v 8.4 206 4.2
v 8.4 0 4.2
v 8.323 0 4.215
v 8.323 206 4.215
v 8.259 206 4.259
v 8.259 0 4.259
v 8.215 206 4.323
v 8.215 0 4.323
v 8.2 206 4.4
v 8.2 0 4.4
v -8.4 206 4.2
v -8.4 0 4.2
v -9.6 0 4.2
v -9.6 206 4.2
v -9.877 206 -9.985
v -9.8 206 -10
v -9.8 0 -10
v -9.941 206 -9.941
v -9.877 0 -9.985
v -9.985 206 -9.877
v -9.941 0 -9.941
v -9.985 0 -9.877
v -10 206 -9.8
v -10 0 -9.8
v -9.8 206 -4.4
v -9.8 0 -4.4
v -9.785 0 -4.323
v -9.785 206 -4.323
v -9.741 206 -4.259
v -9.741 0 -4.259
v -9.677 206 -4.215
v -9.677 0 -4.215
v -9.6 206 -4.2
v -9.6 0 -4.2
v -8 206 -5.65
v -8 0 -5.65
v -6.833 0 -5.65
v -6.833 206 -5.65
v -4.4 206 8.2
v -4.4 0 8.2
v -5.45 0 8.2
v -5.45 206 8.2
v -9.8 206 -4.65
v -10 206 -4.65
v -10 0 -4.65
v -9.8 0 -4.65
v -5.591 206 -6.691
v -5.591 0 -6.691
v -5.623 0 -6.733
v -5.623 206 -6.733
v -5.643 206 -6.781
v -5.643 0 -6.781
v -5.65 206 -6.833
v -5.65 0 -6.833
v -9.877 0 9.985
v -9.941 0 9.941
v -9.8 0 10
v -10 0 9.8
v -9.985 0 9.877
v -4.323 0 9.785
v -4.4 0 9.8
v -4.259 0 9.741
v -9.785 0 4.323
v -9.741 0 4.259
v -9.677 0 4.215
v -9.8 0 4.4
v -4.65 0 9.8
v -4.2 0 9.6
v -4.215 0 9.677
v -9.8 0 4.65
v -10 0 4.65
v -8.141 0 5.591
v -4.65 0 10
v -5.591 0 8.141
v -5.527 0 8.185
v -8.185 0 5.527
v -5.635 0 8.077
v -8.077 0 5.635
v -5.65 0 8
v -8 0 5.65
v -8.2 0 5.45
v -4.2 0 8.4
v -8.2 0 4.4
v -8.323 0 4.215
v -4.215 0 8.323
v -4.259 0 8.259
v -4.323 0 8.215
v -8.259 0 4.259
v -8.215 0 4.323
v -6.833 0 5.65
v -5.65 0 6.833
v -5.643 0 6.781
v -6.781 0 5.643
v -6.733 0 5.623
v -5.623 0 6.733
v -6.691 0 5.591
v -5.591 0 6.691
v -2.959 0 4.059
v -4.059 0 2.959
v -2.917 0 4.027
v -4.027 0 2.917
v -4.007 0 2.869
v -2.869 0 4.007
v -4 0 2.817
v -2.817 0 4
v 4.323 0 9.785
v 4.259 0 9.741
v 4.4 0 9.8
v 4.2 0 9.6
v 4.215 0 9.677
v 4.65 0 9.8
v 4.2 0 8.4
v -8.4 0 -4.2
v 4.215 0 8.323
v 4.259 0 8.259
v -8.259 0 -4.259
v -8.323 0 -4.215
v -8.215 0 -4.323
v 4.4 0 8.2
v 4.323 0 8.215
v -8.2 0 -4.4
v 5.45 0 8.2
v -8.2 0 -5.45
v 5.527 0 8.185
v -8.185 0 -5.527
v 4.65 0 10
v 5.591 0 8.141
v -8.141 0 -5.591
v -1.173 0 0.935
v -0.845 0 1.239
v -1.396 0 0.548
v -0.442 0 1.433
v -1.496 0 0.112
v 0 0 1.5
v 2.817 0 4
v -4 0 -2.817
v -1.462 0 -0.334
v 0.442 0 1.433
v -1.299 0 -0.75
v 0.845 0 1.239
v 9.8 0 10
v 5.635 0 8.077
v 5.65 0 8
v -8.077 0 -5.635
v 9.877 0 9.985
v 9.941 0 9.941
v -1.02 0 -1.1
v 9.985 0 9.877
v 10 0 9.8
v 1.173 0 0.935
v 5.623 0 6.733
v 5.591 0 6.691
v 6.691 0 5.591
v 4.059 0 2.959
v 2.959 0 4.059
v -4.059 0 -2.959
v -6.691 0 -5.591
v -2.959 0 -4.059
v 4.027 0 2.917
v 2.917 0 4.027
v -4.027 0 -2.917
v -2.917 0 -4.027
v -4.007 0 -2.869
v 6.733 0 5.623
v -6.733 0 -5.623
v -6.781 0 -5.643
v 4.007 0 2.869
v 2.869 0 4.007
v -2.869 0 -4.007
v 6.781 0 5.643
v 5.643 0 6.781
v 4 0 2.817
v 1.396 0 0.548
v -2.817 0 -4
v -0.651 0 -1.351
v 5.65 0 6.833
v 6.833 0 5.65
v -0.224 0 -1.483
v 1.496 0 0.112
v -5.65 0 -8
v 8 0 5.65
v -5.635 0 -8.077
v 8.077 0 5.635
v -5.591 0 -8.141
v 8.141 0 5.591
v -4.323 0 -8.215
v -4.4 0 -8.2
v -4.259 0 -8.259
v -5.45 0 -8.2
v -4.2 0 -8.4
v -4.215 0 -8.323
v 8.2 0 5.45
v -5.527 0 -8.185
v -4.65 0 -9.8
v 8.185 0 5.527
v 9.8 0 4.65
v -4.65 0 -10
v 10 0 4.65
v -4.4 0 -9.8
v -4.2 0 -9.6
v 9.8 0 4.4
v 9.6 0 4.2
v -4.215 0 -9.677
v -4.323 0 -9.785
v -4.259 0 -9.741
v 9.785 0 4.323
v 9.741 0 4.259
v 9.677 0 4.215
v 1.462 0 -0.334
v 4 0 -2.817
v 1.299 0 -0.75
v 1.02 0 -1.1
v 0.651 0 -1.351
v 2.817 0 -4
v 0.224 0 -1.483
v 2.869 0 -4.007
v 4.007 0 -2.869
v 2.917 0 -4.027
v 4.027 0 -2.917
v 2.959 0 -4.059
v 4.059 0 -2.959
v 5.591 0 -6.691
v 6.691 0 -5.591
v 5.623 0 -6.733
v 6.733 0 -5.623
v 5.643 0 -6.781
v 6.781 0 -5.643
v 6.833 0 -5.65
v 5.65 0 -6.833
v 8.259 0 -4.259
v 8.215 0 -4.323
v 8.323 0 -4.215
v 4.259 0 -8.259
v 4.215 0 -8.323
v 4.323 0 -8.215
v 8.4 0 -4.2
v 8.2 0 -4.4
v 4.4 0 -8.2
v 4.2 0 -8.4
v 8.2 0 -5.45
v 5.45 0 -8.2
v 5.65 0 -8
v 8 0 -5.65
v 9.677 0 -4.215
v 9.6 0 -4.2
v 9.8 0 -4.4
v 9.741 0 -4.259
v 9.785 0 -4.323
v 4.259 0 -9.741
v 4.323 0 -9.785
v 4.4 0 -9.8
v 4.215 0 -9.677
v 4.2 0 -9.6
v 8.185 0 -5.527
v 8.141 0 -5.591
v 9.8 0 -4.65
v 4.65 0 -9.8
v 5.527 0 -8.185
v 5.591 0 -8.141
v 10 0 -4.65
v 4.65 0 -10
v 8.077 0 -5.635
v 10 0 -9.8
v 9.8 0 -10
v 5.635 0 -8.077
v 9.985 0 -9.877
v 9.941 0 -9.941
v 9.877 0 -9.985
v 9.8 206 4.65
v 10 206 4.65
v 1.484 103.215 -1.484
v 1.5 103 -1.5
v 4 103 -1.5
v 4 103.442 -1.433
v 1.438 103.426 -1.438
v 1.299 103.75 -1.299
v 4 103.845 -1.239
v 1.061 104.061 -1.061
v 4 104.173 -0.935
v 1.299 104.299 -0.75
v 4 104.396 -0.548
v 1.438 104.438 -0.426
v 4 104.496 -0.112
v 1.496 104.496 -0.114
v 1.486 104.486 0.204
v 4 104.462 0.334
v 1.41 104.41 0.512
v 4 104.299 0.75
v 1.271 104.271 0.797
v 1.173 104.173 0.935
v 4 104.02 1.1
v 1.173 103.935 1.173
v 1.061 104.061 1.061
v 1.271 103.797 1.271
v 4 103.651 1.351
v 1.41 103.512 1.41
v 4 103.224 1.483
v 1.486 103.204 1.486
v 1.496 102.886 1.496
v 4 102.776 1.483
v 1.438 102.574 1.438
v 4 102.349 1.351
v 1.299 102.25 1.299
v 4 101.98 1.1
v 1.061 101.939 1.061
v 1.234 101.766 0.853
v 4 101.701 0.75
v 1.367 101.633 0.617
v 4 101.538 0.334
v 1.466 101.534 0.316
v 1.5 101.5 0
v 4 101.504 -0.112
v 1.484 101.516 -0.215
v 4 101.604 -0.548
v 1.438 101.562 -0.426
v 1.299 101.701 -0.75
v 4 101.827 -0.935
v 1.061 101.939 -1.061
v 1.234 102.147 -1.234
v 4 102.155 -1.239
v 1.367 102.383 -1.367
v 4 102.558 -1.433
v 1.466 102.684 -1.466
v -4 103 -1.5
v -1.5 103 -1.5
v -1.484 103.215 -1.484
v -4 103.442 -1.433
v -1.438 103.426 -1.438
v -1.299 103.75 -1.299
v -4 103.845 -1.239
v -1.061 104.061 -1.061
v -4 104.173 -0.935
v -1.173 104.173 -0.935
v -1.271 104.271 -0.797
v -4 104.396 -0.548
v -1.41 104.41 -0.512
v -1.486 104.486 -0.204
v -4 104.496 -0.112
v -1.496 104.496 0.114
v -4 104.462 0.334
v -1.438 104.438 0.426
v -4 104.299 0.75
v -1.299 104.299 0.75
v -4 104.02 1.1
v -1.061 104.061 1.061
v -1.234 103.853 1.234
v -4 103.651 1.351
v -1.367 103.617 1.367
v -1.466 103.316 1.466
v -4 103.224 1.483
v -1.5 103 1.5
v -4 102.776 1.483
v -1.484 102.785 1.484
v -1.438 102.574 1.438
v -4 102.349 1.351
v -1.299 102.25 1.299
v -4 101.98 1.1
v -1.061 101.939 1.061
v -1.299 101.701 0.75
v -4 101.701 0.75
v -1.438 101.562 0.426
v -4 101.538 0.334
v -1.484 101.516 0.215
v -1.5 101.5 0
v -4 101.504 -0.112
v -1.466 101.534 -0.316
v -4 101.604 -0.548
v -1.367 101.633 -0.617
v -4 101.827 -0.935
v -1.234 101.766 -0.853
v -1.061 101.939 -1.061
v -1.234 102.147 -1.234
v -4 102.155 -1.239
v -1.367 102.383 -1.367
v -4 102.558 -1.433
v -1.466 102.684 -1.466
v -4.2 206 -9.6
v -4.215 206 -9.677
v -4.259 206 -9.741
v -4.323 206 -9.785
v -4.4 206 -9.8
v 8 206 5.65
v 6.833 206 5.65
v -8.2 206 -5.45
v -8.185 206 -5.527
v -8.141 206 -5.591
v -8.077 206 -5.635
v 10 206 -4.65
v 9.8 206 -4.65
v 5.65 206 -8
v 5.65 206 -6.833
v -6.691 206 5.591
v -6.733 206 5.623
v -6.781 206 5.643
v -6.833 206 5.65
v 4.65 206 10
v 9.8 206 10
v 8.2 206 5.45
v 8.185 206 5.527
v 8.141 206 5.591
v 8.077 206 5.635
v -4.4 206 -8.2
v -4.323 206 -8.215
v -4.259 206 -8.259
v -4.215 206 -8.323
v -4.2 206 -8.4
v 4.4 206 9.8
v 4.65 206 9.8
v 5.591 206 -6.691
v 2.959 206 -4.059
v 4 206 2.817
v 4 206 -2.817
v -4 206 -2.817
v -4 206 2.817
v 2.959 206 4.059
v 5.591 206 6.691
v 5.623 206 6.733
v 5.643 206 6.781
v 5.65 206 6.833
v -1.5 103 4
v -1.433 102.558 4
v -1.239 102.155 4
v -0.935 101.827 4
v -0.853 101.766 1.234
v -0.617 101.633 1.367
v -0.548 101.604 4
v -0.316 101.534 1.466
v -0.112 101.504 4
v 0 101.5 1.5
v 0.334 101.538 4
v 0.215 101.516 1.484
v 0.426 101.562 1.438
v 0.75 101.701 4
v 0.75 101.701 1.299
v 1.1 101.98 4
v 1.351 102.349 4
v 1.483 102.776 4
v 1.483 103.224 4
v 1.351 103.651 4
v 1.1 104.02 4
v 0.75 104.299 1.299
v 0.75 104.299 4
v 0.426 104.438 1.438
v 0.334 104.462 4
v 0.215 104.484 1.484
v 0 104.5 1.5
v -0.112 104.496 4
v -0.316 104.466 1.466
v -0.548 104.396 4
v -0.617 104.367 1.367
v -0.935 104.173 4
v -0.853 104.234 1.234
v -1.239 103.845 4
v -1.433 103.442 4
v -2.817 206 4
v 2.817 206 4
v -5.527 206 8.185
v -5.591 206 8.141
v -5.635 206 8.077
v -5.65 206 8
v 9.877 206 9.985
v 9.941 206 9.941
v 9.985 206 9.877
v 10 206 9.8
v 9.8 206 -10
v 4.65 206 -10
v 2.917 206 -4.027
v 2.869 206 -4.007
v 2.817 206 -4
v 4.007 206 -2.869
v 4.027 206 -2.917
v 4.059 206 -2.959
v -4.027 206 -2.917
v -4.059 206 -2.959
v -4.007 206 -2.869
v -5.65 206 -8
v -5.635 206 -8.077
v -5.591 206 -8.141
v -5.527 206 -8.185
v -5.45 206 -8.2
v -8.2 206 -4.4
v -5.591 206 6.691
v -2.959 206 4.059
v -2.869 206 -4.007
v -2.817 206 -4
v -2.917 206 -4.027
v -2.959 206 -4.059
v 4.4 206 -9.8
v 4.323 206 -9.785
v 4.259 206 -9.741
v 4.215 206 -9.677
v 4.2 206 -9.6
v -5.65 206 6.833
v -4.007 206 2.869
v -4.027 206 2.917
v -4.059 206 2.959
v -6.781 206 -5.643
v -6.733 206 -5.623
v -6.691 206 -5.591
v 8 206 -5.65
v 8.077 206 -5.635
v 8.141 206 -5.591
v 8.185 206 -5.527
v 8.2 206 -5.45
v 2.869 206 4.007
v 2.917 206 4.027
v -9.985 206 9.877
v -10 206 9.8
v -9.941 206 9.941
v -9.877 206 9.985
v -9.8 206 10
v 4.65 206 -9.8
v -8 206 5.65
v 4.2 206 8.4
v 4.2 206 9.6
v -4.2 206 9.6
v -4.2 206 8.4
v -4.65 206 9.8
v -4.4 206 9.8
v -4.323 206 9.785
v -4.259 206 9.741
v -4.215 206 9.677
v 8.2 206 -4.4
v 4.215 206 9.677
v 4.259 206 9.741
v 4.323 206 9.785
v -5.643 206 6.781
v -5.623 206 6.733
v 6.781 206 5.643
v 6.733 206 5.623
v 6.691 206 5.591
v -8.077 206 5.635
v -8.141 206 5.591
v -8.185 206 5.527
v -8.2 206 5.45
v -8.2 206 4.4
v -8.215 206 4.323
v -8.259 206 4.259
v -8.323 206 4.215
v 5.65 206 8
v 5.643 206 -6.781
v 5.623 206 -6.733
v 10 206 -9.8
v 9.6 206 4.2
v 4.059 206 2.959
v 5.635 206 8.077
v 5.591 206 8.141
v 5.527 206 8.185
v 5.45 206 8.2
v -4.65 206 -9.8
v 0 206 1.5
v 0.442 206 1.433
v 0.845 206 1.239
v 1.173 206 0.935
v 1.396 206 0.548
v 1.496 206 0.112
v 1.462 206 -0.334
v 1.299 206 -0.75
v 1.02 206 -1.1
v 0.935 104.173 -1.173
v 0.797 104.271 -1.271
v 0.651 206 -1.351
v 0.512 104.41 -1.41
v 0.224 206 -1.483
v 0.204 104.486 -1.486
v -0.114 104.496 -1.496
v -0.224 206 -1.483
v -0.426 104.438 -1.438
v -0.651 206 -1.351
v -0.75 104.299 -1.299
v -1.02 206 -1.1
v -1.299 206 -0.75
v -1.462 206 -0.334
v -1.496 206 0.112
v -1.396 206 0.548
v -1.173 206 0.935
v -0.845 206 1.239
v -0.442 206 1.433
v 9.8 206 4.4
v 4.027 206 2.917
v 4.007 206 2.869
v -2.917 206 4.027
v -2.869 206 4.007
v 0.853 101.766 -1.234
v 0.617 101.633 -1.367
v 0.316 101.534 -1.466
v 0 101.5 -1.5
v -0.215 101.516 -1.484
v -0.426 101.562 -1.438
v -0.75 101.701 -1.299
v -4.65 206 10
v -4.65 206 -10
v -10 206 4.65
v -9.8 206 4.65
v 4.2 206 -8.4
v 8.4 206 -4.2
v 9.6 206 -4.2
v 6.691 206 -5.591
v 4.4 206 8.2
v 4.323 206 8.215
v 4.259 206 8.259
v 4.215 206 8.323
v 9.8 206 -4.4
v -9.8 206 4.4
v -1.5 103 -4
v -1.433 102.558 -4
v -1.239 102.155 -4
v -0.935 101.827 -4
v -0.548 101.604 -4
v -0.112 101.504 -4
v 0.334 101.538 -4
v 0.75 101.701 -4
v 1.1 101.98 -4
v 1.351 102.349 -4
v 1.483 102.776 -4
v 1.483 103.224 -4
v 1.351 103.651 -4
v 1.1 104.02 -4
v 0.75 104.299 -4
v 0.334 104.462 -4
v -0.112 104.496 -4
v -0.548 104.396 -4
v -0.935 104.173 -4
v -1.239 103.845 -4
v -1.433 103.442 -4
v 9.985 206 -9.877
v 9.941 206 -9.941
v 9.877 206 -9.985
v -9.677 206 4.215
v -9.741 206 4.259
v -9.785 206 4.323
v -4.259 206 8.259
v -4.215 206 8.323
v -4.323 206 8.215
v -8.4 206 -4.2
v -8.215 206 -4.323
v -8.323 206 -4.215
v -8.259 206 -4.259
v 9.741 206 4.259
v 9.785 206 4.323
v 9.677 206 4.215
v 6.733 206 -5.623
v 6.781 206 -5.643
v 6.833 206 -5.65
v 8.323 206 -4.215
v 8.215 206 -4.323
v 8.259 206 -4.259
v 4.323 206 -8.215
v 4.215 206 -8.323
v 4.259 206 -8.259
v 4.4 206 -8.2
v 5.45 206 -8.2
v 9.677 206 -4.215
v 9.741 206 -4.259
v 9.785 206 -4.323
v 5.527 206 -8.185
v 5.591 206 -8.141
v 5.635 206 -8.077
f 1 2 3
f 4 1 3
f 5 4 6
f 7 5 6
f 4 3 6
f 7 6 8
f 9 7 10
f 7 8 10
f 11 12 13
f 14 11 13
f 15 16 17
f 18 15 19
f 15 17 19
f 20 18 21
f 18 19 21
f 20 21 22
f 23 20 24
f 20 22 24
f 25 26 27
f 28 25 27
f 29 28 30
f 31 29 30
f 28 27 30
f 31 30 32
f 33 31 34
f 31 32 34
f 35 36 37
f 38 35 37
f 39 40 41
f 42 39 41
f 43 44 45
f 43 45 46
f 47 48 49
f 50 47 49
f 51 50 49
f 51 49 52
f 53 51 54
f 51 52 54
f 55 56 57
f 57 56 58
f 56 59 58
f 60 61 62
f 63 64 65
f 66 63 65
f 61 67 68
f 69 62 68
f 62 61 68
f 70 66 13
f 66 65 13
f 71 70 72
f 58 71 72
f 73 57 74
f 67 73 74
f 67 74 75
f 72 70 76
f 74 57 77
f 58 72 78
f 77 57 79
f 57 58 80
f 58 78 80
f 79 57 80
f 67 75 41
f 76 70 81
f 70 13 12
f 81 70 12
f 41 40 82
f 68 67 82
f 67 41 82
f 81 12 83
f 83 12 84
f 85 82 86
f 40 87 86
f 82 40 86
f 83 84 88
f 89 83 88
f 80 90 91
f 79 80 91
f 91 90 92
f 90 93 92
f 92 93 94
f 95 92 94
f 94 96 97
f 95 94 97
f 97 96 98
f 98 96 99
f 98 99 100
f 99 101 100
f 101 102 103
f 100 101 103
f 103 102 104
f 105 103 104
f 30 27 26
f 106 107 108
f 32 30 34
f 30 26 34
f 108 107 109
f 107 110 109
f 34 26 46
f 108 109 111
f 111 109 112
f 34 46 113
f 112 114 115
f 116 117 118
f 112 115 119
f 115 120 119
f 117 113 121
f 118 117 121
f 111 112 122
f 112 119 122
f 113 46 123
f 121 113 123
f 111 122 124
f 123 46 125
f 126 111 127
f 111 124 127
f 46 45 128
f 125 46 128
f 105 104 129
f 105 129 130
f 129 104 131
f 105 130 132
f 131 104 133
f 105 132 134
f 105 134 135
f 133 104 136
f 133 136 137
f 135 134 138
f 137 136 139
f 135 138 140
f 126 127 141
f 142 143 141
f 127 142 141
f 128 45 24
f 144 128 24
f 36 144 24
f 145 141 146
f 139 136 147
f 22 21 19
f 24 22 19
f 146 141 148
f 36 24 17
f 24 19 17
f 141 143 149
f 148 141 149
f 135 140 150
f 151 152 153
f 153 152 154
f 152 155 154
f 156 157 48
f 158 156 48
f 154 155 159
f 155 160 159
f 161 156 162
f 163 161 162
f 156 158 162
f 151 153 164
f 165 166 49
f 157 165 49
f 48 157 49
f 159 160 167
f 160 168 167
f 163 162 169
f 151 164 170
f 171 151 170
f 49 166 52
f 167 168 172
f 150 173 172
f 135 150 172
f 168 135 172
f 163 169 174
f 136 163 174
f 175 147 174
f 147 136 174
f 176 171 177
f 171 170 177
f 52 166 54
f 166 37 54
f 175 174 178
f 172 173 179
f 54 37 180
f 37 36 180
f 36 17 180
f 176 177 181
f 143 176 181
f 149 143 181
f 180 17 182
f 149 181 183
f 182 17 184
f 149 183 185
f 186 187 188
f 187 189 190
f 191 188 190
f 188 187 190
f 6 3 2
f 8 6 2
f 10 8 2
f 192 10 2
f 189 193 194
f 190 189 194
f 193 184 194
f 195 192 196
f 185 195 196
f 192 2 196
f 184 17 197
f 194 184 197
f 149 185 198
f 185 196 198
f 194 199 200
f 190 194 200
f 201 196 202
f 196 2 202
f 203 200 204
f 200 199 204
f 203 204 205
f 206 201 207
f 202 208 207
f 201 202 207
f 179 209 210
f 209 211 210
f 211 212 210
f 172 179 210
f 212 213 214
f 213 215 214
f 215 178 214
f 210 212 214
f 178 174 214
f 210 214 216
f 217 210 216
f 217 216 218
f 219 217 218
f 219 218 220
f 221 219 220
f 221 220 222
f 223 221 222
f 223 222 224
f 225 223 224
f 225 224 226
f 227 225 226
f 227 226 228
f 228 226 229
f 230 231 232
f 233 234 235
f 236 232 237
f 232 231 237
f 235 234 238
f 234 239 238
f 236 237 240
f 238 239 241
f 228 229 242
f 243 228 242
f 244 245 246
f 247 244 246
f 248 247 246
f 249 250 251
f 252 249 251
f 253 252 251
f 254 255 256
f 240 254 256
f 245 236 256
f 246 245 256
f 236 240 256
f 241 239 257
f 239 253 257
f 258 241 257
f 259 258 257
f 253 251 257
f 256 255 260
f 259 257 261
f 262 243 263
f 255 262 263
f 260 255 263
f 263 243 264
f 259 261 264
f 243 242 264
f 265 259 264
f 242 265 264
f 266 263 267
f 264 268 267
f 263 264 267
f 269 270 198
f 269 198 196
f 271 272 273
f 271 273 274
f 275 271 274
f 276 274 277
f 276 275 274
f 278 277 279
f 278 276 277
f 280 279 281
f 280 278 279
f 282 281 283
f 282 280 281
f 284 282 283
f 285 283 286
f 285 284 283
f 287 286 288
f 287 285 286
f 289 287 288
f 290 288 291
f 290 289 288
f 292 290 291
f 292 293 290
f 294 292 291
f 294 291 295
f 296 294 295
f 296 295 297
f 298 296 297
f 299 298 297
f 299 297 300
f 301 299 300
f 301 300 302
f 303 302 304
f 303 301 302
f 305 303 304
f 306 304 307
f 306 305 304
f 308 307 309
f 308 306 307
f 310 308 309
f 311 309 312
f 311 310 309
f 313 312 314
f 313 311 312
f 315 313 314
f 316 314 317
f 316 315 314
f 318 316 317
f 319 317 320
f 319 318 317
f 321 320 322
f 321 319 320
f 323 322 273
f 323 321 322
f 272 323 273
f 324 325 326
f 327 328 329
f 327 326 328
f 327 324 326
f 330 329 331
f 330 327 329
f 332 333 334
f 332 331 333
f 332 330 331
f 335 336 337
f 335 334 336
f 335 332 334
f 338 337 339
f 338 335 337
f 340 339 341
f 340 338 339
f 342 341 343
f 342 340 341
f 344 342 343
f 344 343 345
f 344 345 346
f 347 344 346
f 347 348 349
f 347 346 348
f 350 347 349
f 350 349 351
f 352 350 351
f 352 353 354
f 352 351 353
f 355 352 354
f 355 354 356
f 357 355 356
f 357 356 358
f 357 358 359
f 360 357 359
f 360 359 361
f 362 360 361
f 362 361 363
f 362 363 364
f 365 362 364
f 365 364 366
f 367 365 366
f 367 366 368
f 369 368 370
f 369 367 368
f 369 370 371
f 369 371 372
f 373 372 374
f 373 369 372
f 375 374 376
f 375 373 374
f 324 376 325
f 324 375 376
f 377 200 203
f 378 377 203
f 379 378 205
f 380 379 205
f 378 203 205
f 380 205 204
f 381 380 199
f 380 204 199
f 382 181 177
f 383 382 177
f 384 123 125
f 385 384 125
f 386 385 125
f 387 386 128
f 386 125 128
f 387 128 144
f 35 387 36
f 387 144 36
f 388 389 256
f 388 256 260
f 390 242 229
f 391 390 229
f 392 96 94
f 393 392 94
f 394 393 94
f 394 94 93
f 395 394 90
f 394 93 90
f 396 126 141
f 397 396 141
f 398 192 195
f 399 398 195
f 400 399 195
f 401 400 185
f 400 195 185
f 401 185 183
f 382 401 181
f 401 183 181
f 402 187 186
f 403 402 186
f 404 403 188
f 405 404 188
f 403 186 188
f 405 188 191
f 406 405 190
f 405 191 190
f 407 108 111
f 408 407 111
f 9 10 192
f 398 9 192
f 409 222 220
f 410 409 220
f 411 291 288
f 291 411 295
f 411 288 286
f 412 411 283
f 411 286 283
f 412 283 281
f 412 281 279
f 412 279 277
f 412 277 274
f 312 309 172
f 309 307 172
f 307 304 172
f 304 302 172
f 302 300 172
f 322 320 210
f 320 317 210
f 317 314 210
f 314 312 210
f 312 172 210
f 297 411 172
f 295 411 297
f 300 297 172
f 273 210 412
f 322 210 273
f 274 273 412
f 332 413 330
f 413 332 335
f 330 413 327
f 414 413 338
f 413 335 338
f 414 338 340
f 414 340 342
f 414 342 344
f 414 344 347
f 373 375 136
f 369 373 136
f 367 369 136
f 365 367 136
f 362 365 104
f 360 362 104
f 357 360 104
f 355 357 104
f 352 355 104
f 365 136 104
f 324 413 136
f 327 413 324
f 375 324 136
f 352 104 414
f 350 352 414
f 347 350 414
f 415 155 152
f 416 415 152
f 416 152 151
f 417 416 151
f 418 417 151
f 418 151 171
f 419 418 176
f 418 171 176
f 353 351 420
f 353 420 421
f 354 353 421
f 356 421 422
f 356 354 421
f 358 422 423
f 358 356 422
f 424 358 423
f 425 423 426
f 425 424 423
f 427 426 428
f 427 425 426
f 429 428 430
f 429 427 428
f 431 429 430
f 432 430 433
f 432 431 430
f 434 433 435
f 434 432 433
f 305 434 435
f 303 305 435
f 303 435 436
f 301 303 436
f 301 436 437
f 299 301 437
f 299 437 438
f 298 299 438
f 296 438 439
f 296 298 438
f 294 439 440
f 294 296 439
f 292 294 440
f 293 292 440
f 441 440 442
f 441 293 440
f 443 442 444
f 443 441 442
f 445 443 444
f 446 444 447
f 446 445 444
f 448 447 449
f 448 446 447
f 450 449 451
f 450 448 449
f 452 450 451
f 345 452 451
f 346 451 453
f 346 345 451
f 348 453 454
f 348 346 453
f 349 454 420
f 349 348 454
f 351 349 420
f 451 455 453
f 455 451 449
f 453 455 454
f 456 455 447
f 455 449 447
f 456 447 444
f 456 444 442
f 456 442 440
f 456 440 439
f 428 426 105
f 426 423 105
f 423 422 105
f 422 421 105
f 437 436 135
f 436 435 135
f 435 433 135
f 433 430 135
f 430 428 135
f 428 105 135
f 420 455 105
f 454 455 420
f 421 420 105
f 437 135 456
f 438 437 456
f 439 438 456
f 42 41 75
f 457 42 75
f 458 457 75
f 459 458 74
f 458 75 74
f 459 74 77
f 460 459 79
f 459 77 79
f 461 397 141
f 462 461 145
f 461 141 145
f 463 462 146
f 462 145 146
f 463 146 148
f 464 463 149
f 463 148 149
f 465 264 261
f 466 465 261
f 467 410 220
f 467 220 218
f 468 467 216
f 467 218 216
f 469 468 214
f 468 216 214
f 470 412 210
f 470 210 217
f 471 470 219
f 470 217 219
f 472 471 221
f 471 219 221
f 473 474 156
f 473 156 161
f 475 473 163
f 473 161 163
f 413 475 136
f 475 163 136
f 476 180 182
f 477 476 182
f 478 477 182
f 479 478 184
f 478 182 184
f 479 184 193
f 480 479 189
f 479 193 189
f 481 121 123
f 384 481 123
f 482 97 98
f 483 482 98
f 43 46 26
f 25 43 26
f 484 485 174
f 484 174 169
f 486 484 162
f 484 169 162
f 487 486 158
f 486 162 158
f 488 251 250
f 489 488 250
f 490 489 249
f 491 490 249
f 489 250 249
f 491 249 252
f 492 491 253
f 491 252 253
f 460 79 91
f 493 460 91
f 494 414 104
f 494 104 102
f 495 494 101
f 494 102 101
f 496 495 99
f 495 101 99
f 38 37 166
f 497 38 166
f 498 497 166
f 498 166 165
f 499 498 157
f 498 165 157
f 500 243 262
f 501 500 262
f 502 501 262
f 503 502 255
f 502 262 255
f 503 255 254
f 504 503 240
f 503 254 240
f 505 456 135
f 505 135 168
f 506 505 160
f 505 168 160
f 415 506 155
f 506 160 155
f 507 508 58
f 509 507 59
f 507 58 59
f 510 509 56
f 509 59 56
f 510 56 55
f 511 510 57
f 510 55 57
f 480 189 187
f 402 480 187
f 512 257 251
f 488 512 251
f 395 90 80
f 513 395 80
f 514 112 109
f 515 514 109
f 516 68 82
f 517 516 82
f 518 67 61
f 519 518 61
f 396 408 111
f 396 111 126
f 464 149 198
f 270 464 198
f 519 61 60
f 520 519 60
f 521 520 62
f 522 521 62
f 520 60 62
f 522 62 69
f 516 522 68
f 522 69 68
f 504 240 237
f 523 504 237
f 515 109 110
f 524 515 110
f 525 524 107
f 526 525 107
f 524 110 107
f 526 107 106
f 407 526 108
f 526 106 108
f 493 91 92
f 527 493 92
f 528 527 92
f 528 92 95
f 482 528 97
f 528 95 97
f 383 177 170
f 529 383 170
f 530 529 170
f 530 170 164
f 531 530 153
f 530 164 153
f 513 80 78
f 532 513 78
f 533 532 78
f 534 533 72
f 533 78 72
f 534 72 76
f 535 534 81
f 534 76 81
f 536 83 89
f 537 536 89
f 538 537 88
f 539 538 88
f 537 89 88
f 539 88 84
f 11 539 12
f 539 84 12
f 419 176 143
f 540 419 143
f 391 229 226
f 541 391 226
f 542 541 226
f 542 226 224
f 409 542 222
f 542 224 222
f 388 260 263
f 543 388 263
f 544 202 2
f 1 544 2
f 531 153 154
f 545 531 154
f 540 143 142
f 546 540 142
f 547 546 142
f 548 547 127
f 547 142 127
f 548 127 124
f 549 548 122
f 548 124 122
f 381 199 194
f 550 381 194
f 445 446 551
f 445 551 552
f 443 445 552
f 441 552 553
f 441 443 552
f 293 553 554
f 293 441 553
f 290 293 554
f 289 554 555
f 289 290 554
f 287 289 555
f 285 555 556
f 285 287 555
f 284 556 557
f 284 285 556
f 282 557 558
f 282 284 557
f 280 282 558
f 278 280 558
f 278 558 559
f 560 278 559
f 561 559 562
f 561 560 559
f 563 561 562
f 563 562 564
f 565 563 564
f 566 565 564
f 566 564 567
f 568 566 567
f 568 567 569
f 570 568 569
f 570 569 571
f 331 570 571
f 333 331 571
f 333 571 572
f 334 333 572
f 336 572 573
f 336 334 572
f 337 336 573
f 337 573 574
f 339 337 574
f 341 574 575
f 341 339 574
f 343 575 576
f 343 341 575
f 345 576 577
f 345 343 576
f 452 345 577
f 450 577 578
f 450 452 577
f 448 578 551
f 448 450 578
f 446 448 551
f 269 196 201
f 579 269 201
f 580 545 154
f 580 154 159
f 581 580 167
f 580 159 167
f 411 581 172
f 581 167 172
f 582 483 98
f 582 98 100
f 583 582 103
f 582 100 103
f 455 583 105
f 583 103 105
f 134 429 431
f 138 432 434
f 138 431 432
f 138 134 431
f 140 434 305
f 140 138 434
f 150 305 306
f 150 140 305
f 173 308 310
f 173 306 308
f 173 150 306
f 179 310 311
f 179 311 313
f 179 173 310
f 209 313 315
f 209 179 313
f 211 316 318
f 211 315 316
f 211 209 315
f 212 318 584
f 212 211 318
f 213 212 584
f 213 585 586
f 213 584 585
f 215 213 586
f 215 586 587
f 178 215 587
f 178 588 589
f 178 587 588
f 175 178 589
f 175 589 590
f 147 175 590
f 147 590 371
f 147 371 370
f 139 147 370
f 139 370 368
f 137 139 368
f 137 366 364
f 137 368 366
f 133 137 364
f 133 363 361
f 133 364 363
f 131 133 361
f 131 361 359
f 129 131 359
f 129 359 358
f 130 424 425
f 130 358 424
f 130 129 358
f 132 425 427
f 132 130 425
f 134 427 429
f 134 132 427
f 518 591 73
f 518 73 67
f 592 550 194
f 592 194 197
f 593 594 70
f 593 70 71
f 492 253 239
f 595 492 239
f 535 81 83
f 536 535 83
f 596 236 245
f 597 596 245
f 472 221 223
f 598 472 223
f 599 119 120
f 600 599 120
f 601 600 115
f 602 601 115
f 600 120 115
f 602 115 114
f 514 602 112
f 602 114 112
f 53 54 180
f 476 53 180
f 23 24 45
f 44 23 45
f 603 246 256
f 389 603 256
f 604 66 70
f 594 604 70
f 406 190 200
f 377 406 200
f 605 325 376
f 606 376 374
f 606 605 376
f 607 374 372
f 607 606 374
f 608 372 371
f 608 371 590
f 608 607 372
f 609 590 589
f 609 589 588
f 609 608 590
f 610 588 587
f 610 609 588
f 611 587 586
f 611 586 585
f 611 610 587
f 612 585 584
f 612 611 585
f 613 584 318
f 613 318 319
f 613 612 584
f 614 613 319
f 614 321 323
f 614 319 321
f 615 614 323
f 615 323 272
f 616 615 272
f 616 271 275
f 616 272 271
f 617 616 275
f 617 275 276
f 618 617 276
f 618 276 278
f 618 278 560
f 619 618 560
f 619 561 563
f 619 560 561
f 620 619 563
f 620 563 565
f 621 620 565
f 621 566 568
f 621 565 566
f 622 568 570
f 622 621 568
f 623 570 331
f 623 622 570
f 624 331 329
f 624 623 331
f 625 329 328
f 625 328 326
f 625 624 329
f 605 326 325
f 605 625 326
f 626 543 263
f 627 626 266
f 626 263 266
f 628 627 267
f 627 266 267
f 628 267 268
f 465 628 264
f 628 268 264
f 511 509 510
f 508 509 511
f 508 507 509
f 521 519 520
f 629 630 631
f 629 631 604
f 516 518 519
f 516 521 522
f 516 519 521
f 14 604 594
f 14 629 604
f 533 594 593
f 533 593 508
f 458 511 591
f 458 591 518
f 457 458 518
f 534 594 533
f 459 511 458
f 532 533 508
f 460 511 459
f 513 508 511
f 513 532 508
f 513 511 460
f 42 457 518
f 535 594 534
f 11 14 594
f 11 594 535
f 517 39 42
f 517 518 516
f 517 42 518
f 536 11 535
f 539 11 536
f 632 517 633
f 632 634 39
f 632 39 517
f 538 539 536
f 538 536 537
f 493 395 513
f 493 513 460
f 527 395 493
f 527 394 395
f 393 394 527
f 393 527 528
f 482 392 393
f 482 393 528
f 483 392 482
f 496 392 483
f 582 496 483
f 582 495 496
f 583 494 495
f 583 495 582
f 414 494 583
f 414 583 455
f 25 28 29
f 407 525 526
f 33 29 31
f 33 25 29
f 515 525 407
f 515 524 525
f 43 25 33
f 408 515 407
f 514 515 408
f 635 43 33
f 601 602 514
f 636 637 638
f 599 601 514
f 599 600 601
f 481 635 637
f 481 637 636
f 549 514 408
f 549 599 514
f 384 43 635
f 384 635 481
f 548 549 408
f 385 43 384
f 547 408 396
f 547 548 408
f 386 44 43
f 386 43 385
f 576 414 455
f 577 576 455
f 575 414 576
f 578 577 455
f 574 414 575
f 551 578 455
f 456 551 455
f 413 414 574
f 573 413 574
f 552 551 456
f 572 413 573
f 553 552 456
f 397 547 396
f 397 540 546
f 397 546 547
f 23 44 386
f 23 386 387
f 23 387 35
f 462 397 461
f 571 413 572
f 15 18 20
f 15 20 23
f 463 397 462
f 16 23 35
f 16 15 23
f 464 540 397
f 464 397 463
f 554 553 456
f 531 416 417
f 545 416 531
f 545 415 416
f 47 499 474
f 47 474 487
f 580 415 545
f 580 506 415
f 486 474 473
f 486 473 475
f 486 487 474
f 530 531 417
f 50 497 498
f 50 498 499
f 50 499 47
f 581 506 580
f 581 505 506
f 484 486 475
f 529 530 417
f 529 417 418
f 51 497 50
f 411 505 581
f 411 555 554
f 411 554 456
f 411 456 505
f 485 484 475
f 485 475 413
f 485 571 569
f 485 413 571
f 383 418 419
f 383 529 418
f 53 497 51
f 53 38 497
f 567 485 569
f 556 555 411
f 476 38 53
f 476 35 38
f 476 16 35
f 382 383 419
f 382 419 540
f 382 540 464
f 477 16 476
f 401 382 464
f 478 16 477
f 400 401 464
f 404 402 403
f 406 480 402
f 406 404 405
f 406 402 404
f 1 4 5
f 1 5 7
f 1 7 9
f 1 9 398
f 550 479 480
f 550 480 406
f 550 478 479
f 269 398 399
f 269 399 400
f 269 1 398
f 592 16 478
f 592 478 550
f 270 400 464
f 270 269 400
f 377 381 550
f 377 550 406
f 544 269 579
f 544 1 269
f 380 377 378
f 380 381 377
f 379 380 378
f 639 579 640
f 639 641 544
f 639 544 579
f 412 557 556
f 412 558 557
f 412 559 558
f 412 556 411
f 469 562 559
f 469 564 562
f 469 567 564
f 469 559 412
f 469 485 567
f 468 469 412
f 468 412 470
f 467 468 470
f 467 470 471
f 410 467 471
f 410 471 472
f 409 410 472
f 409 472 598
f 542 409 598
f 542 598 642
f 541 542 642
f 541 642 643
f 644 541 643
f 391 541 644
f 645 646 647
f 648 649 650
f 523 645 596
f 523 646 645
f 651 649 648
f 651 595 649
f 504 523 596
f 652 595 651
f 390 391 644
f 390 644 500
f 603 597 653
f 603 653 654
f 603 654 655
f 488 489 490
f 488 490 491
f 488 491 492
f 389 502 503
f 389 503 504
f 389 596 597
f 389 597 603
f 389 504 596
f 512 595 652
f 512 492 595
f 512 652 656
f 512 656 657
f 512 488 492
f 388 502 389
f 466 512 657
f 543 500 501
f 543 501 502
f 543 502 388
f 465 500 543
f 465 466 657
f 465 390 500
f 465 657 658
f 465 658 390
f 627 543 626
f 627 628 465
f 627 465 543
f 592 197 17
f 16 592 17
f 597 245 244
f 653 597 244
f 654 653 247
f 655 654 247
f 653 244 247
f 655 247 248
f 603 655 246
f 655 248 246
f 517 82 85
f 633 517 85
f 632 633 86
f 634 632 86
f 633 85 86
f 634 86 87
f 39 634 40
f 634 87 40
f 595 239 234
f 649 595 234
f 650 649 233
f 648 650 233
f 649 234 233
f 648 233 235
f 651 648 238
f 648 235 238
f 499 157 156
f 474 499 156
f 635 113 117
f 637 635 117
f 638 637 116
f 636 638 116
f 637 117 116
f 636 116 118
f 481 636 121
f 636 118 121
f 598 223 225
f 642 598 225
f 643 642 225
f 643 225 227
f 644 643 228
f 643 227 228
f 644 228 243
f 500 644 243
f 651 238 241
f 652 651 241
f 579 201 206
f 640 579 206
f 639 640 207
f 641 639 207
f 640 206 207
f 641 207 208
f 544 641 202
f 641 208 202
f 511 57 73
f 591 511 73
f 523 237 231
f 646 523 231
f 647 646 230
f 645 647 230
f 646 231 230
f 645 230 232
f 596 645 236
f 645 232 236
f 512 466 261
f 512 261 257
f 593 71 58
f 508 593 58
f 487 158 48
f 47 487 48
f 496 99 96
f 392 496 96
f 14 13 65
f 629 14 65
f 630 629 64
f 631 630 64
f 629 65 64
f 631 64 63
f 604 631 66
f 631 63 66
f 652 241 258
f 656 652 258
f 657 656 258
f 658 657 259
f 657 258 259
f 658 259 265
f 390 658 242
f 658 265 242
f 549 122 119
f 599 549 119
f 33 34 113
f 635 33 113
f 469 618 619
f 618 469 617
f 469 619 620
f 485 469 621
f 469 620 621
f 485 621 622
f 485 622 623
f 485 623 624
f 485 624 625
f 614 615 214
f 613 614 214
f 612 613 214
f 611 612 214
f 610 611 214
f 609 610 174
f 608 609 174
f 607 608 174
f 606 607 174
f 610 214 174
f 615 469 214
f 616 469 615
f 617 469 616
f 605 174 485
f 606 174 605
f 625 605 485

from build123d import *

# Parameters (mm, degrees)
SKETCH1_R               = 1.5
BOSS_EXTRUDE1_DEPTH     = 206
CUT_EXTRUDE1_DEPTH      = 10
CUT_EXTRUDE1_DEPTH_BACK = 10
SKETCH2_R               = 1.5
CUT_EXTRUDE2_DEPTH      = 10
CUT_EXTRUDE2_DEPTH_BACK = 10
SKETCH4_R               = 1.5


with BuildPart() as part:
    # Sketch1 → Boss-Extrude1 (new body)
    with BuildSketch(Plane(origin=(0, 0, 0), x_dir=(1, 0, 0), z_dir=(0, 1, 0))):
        with BuildLine():
            Line((-10, 4.65), (-9.8, 4.65))
            Line((-9.8, 4.65), (-9.8, 4.4))
            ThreePointArc((-9.8, 4.4), (-9.741421356, 4.258578644), (-9.6, 4.2))
            Line((-9.6, 4.2), (-8.4, 4.2))
            ThreePointArc((-8.4, 4.2), (-8.258578644, 4.258578644), (-8.2, 4.4))
            Line((-8.2, 4.4), (-8.2, 5.45))
            ThreePointArc((-8.2, 5.45), (-8.141421356, 5.591421356), (-8, 5.65))
            Line((-8, 5.65), (-6.832842712, 5.65))
            ThreePointArc((-6.832842712, 5.65), (-6.756306026, 5.634775907), (-6.691421356, 5.591421356))
            Line((-6.691421356, 5.591421356), (-4.058578644, 2.958578644))
            ThreePointArc((-4.058578644, 2.958578644), (-4.015224093, 2.893693974), (-4, 2.817157288))
            Line((-4, 2.817157288), (-4, -2.817157288))
            ThreePointArc((-4, -2.817157288), (-4.015224093, -2.893693974), (-4.058578644, -2.958578644))
            Line((-4.058578644, -2.958578644), (-6.691421356, -5.591421356))
            ThreePointArc((-6.691421356, -5.591421356), (-6.756306026, -5.634775907), (-6.832842712, -5.65))
            Line((-6.832842712, -5.65), (-8, -5.65))
            ThreePointArc((-8, -5.65), (-8.141421356, -5.591421356), (-8.2, -5.45))
            Line((-8.2, -5.45), (-8.2, -4.4))
            ThreePointArc((-8.2, -4.4), (-8.258578644, -4.258578644), (-8.4, -4.2))
            Line((-8.4, -4.2), (-9.6, -4.2))
            ThreePointArc((-9.6, -4.2), (-9.741421356, -4.258578644), (-9.8, -4.4))
            Line((-9.8, -4.4), (-9.8, -4.65))
            Line((-9.8, -4.65), (-10, -4.65))
            Line((-10, -4.65), (-10, -9.8))
            ThreePointArc((-10, -9.8), (-9.941421356, -9.941421356), (-9.8, -10))
            Line((-9.8, -10), (-4.65, -10))
            Line((-4.65, -10), (-4.65, -9.8))
            Line((-4.65, -9.8), (-4.4, -9.8))
            ThreePointArc((-4.4, -9.8), (-4.258578644, -9.741421356), (-4.2, -9.6))
            Line((-4.2, -9.6), (-4.2, -8.4))
            ThreePointArc((-4.2, -8.4), (-4.258578644, -8.258578644), (-4.4, -8.2))
            Line((-4.4, -8.2), (-5.45, -8.2))
            ThreePointArc((-5.45, -8.2), (-5.591421356, -8.141421356), (-5.65, -8))
            Line((-5.65, -8), (-5.65, -6.832842712))
            ThreePointArc((-5.65, -6.832842712), (-5.634775907, -6.756306026), (-5.591421356, -6.691421356))
            Line((-5.591421356, -6.691421356), (-2.958578644, -4.058578644))
            ThreePointArc((-2.958578644, -4.058578644), (-2.893693974, -4.015224093), (-2.817157288, -4))
            Line((-2.817157288, -4), (2.817157288, -4))
            ThreePointArc((2.817157288, -4), (2.893693974, -4.015224093), (2.958578644, -4.058578644))
            Line((2.958578644, -4.058578644), (5.591421356, -6.691421356))
            ThreePointArc((5.591421356, -6.691421356), (5.634775907, -6.756306026), (5.65, -6.832842712))
            Line((5.65, -6.832842712), (5.65, -8))
            ThreePointArc((5.65, -8), (5.591421356, -8.141421356), (5.45, -8.2))
            Line((5.45, -8.2), (4.4, -8.2))
            ThreePointArc((4.4, -8.2), (4.258578644, -8.258578644), (4.2, -8.4))
            Line((4.2, -8.4), (4.2, -9.6))
            ThreePointArc((4.2, -9.6), (4.258578644, -9.741421356), (4.4, -9.8))
            Line((4.4, -9.8), (4.65, -9.8))
            Line((4.65, -9.8), (4.65, -10))
            Line((4.65, -10), (9.8, -10))
            ThreePointArc((9.8, -10), (9.941421356, -9.941421356), (10, -9.8))
            Line((10, -9.8), (10, -4.65))
            Line((10, -4.65), (9.8, -4.65))
            Line((9.8, -4.65), (9.8, -4.4))
            ThreePointArc((9.8, -4.4), (9.741421356, -4.258578644), (9.6, -4.2))
            Line((9.6, -4.2), (8.4, -4.2))
            ThreePointArc((8.4, -4.2), (8.258578644, -4.258578644), (8.2, -4.4))
            Line((8.2, -4.4), (8.2, -5.45))
            ThreePointArc((8.2, -5.45), (8.141421356, -5.591421356), (8, -5.65))
            Line((8, -5.65), (6.832842712, -5.65))
            ThreePointArc((6.832842712, -5.65), (6.756306026, -5.634775907), (6.691421356, -5.591421356))
            Line((6.691421356, -5.591421356), (4.058578644, -2.958578644))
            ThreePointArc((4.058578644, -2.958578644), (4.015224093, -2.893693974), (4, -2.817157288))
            Line((4, -2.817157288), (4, 2.817157288))
            ThreePointArc((4, 2.817157288), (4.015224093, 2.893693974), (4.058578644, 2.958578644))
            Line((4.058578644, 2.958578644), (6.691421356, 5.591421356))
            ThreePointArc((6.691421356, 5.591421356), (6.756306026, 5.634775907), (6.832842712, 5.65))
            Line((6.832842712, 5.65), (8, 5.65))
            ThreePointArc((8, 5.65), (8.141421356, 5.591421356), (8.2, 5.45))
            Line((8.2, 5.45), (8.2, 4.4))
            ThreePointArc((8.2, 4.4), (8.258578644, 4.258578644), (8.4, 4.2))
            Line((8.4, 4.2), (9.6, 4.2))
            ThreePointArc((9.6, 4.2), (9.741421356, 4.258578644), (9.8, 4.4))
            Line((9.8, 4.4), (9.8, 4.65))
            Line((9.8, 4.65), (10, 4.65))
            Line((10, 4.65), (10, 9.8))
            ThreePointArc((10, 9.8), (9.941421356, 9.941421356), (9.8, 10))
            Line((9.8, 10), (4.65, 10))
            Line((4.65, 10), (4.65, 9.8))
            Line((4.65, 9.8), (4.4, 9.8))
            ThreePointArc((4.4, 9.8), (4.258578644, 9.741421356), (4.2, 9.6))
            Line((4.2, 9.6), (4.2, 8.4))
            ThreePointArc((4.2, 8.4), (4.258578644, 8.258578644), (4.4, 8.2))
            Line((4.4, 8.2), (5.45, 8.2))
            ThreePointArc((5.45, 8.2), (5.591421356, 8.141421356), (5.65, 8))
            Line((5.65, 8), (5.65, 6.832842712))
            ThreePointArc((5.65, 6.832842712), (5.634775907, 6.756306026), (5.591421356, 6.691421356))
            Line((5.591421356, 6.691421356), (2.958578644, 4.058578644))
            ThreePointArc((2.958578644, 4.058578644), (2.893693974, 4.015224093), (2.817157288, 4))
            Line((2.817157288, 4), (-2.817157288, 4))
            ThreePointArc((-2.817157288, 4), (-2.893693974, 4.015224093), (-2.958578644, 4.058578644))
            Line((-2.958578644, 4.058578644), (-5.591421356, 6.691421356))
            ThreePointArc((-5.591421356, 6.691421356), (-5.634775907, 6.756306026), (-5.65, 6.832842712))
            Line((-5.65, 6.832842712), (-5.65, 8))
            ThreePointArc((-5.65, 8), (-5.591421356, 8.141421356), (-5.45, 8.2))
            Line((-5.45, 8.2), (-4.4, 8.2))
            ThreePointArc((-4.4, 8.2), (-4.258578644, 8.258578644), (-4.2, 8.4))
            Line((-4.2, 8.4), (-4.2, 9.6))
            ThreePointArc((-4.2, 9.6), (-4.258578644, 9.741421356), (-4.4, 9.8))
            Line((-4.4, 9.8), (-4.65, 9.8))
            Line((-4.65, 9.8), (-4.65, 10))
            Line((-4.65, 10), (-9.8, 10))
            ThreePointArc((-9.8, 10), (-9.941421356, 9.941421356), (-10, 9.8))
            Line((-10, 9.8), (-10, 4.65))
        make_face()
        with Locations(Location((0, 0, 0), (0, 0, 270))):
            Circle(SKETCH1_R, mode=Mode.SUBTRACT)
    extrude(amount=BOSS_EXTRUDE1_DEPTH)

    # Sketch2 → Cut-Extrude1 (cut, two sides: drawn at the far end of the back side and taken through both)
    with BuildSketch(Plane(origin=(4, 0, 0), x_dir=(0, 0, -1), z_dir=(1, 0, 0)).offset(-CUT_EXTRUDE1_DEPTH_BACK)):
        with Locations((0, 103)):
            Circle(SKETCH2_R)
    extrude(amount=CUT_EXTRUDE1_DEPTH + CUT_EXTRUDE1_DEPTH_BACK, mode=Mode.SUBTRACT)

    # Sketch4 → Cut-Extrude2 (cut, two sides: drawn at the far end of the back side and taken through both)
    with BuildSketch(Plane.XY.offset(4).offset(-CUT_EXTRUDE2_DEPTH_BACK)):
        with Locations(Location((0, 103, 0), (0, 0, 180))):
            Circle(SKETCH4_R)
    extrude(amount=CUT_EXTRUDE2_DEPTH + CUT_EXTRUDE2_DEPTH_BACK, mode=Mode.SUBTRACT)


solid = part.part
